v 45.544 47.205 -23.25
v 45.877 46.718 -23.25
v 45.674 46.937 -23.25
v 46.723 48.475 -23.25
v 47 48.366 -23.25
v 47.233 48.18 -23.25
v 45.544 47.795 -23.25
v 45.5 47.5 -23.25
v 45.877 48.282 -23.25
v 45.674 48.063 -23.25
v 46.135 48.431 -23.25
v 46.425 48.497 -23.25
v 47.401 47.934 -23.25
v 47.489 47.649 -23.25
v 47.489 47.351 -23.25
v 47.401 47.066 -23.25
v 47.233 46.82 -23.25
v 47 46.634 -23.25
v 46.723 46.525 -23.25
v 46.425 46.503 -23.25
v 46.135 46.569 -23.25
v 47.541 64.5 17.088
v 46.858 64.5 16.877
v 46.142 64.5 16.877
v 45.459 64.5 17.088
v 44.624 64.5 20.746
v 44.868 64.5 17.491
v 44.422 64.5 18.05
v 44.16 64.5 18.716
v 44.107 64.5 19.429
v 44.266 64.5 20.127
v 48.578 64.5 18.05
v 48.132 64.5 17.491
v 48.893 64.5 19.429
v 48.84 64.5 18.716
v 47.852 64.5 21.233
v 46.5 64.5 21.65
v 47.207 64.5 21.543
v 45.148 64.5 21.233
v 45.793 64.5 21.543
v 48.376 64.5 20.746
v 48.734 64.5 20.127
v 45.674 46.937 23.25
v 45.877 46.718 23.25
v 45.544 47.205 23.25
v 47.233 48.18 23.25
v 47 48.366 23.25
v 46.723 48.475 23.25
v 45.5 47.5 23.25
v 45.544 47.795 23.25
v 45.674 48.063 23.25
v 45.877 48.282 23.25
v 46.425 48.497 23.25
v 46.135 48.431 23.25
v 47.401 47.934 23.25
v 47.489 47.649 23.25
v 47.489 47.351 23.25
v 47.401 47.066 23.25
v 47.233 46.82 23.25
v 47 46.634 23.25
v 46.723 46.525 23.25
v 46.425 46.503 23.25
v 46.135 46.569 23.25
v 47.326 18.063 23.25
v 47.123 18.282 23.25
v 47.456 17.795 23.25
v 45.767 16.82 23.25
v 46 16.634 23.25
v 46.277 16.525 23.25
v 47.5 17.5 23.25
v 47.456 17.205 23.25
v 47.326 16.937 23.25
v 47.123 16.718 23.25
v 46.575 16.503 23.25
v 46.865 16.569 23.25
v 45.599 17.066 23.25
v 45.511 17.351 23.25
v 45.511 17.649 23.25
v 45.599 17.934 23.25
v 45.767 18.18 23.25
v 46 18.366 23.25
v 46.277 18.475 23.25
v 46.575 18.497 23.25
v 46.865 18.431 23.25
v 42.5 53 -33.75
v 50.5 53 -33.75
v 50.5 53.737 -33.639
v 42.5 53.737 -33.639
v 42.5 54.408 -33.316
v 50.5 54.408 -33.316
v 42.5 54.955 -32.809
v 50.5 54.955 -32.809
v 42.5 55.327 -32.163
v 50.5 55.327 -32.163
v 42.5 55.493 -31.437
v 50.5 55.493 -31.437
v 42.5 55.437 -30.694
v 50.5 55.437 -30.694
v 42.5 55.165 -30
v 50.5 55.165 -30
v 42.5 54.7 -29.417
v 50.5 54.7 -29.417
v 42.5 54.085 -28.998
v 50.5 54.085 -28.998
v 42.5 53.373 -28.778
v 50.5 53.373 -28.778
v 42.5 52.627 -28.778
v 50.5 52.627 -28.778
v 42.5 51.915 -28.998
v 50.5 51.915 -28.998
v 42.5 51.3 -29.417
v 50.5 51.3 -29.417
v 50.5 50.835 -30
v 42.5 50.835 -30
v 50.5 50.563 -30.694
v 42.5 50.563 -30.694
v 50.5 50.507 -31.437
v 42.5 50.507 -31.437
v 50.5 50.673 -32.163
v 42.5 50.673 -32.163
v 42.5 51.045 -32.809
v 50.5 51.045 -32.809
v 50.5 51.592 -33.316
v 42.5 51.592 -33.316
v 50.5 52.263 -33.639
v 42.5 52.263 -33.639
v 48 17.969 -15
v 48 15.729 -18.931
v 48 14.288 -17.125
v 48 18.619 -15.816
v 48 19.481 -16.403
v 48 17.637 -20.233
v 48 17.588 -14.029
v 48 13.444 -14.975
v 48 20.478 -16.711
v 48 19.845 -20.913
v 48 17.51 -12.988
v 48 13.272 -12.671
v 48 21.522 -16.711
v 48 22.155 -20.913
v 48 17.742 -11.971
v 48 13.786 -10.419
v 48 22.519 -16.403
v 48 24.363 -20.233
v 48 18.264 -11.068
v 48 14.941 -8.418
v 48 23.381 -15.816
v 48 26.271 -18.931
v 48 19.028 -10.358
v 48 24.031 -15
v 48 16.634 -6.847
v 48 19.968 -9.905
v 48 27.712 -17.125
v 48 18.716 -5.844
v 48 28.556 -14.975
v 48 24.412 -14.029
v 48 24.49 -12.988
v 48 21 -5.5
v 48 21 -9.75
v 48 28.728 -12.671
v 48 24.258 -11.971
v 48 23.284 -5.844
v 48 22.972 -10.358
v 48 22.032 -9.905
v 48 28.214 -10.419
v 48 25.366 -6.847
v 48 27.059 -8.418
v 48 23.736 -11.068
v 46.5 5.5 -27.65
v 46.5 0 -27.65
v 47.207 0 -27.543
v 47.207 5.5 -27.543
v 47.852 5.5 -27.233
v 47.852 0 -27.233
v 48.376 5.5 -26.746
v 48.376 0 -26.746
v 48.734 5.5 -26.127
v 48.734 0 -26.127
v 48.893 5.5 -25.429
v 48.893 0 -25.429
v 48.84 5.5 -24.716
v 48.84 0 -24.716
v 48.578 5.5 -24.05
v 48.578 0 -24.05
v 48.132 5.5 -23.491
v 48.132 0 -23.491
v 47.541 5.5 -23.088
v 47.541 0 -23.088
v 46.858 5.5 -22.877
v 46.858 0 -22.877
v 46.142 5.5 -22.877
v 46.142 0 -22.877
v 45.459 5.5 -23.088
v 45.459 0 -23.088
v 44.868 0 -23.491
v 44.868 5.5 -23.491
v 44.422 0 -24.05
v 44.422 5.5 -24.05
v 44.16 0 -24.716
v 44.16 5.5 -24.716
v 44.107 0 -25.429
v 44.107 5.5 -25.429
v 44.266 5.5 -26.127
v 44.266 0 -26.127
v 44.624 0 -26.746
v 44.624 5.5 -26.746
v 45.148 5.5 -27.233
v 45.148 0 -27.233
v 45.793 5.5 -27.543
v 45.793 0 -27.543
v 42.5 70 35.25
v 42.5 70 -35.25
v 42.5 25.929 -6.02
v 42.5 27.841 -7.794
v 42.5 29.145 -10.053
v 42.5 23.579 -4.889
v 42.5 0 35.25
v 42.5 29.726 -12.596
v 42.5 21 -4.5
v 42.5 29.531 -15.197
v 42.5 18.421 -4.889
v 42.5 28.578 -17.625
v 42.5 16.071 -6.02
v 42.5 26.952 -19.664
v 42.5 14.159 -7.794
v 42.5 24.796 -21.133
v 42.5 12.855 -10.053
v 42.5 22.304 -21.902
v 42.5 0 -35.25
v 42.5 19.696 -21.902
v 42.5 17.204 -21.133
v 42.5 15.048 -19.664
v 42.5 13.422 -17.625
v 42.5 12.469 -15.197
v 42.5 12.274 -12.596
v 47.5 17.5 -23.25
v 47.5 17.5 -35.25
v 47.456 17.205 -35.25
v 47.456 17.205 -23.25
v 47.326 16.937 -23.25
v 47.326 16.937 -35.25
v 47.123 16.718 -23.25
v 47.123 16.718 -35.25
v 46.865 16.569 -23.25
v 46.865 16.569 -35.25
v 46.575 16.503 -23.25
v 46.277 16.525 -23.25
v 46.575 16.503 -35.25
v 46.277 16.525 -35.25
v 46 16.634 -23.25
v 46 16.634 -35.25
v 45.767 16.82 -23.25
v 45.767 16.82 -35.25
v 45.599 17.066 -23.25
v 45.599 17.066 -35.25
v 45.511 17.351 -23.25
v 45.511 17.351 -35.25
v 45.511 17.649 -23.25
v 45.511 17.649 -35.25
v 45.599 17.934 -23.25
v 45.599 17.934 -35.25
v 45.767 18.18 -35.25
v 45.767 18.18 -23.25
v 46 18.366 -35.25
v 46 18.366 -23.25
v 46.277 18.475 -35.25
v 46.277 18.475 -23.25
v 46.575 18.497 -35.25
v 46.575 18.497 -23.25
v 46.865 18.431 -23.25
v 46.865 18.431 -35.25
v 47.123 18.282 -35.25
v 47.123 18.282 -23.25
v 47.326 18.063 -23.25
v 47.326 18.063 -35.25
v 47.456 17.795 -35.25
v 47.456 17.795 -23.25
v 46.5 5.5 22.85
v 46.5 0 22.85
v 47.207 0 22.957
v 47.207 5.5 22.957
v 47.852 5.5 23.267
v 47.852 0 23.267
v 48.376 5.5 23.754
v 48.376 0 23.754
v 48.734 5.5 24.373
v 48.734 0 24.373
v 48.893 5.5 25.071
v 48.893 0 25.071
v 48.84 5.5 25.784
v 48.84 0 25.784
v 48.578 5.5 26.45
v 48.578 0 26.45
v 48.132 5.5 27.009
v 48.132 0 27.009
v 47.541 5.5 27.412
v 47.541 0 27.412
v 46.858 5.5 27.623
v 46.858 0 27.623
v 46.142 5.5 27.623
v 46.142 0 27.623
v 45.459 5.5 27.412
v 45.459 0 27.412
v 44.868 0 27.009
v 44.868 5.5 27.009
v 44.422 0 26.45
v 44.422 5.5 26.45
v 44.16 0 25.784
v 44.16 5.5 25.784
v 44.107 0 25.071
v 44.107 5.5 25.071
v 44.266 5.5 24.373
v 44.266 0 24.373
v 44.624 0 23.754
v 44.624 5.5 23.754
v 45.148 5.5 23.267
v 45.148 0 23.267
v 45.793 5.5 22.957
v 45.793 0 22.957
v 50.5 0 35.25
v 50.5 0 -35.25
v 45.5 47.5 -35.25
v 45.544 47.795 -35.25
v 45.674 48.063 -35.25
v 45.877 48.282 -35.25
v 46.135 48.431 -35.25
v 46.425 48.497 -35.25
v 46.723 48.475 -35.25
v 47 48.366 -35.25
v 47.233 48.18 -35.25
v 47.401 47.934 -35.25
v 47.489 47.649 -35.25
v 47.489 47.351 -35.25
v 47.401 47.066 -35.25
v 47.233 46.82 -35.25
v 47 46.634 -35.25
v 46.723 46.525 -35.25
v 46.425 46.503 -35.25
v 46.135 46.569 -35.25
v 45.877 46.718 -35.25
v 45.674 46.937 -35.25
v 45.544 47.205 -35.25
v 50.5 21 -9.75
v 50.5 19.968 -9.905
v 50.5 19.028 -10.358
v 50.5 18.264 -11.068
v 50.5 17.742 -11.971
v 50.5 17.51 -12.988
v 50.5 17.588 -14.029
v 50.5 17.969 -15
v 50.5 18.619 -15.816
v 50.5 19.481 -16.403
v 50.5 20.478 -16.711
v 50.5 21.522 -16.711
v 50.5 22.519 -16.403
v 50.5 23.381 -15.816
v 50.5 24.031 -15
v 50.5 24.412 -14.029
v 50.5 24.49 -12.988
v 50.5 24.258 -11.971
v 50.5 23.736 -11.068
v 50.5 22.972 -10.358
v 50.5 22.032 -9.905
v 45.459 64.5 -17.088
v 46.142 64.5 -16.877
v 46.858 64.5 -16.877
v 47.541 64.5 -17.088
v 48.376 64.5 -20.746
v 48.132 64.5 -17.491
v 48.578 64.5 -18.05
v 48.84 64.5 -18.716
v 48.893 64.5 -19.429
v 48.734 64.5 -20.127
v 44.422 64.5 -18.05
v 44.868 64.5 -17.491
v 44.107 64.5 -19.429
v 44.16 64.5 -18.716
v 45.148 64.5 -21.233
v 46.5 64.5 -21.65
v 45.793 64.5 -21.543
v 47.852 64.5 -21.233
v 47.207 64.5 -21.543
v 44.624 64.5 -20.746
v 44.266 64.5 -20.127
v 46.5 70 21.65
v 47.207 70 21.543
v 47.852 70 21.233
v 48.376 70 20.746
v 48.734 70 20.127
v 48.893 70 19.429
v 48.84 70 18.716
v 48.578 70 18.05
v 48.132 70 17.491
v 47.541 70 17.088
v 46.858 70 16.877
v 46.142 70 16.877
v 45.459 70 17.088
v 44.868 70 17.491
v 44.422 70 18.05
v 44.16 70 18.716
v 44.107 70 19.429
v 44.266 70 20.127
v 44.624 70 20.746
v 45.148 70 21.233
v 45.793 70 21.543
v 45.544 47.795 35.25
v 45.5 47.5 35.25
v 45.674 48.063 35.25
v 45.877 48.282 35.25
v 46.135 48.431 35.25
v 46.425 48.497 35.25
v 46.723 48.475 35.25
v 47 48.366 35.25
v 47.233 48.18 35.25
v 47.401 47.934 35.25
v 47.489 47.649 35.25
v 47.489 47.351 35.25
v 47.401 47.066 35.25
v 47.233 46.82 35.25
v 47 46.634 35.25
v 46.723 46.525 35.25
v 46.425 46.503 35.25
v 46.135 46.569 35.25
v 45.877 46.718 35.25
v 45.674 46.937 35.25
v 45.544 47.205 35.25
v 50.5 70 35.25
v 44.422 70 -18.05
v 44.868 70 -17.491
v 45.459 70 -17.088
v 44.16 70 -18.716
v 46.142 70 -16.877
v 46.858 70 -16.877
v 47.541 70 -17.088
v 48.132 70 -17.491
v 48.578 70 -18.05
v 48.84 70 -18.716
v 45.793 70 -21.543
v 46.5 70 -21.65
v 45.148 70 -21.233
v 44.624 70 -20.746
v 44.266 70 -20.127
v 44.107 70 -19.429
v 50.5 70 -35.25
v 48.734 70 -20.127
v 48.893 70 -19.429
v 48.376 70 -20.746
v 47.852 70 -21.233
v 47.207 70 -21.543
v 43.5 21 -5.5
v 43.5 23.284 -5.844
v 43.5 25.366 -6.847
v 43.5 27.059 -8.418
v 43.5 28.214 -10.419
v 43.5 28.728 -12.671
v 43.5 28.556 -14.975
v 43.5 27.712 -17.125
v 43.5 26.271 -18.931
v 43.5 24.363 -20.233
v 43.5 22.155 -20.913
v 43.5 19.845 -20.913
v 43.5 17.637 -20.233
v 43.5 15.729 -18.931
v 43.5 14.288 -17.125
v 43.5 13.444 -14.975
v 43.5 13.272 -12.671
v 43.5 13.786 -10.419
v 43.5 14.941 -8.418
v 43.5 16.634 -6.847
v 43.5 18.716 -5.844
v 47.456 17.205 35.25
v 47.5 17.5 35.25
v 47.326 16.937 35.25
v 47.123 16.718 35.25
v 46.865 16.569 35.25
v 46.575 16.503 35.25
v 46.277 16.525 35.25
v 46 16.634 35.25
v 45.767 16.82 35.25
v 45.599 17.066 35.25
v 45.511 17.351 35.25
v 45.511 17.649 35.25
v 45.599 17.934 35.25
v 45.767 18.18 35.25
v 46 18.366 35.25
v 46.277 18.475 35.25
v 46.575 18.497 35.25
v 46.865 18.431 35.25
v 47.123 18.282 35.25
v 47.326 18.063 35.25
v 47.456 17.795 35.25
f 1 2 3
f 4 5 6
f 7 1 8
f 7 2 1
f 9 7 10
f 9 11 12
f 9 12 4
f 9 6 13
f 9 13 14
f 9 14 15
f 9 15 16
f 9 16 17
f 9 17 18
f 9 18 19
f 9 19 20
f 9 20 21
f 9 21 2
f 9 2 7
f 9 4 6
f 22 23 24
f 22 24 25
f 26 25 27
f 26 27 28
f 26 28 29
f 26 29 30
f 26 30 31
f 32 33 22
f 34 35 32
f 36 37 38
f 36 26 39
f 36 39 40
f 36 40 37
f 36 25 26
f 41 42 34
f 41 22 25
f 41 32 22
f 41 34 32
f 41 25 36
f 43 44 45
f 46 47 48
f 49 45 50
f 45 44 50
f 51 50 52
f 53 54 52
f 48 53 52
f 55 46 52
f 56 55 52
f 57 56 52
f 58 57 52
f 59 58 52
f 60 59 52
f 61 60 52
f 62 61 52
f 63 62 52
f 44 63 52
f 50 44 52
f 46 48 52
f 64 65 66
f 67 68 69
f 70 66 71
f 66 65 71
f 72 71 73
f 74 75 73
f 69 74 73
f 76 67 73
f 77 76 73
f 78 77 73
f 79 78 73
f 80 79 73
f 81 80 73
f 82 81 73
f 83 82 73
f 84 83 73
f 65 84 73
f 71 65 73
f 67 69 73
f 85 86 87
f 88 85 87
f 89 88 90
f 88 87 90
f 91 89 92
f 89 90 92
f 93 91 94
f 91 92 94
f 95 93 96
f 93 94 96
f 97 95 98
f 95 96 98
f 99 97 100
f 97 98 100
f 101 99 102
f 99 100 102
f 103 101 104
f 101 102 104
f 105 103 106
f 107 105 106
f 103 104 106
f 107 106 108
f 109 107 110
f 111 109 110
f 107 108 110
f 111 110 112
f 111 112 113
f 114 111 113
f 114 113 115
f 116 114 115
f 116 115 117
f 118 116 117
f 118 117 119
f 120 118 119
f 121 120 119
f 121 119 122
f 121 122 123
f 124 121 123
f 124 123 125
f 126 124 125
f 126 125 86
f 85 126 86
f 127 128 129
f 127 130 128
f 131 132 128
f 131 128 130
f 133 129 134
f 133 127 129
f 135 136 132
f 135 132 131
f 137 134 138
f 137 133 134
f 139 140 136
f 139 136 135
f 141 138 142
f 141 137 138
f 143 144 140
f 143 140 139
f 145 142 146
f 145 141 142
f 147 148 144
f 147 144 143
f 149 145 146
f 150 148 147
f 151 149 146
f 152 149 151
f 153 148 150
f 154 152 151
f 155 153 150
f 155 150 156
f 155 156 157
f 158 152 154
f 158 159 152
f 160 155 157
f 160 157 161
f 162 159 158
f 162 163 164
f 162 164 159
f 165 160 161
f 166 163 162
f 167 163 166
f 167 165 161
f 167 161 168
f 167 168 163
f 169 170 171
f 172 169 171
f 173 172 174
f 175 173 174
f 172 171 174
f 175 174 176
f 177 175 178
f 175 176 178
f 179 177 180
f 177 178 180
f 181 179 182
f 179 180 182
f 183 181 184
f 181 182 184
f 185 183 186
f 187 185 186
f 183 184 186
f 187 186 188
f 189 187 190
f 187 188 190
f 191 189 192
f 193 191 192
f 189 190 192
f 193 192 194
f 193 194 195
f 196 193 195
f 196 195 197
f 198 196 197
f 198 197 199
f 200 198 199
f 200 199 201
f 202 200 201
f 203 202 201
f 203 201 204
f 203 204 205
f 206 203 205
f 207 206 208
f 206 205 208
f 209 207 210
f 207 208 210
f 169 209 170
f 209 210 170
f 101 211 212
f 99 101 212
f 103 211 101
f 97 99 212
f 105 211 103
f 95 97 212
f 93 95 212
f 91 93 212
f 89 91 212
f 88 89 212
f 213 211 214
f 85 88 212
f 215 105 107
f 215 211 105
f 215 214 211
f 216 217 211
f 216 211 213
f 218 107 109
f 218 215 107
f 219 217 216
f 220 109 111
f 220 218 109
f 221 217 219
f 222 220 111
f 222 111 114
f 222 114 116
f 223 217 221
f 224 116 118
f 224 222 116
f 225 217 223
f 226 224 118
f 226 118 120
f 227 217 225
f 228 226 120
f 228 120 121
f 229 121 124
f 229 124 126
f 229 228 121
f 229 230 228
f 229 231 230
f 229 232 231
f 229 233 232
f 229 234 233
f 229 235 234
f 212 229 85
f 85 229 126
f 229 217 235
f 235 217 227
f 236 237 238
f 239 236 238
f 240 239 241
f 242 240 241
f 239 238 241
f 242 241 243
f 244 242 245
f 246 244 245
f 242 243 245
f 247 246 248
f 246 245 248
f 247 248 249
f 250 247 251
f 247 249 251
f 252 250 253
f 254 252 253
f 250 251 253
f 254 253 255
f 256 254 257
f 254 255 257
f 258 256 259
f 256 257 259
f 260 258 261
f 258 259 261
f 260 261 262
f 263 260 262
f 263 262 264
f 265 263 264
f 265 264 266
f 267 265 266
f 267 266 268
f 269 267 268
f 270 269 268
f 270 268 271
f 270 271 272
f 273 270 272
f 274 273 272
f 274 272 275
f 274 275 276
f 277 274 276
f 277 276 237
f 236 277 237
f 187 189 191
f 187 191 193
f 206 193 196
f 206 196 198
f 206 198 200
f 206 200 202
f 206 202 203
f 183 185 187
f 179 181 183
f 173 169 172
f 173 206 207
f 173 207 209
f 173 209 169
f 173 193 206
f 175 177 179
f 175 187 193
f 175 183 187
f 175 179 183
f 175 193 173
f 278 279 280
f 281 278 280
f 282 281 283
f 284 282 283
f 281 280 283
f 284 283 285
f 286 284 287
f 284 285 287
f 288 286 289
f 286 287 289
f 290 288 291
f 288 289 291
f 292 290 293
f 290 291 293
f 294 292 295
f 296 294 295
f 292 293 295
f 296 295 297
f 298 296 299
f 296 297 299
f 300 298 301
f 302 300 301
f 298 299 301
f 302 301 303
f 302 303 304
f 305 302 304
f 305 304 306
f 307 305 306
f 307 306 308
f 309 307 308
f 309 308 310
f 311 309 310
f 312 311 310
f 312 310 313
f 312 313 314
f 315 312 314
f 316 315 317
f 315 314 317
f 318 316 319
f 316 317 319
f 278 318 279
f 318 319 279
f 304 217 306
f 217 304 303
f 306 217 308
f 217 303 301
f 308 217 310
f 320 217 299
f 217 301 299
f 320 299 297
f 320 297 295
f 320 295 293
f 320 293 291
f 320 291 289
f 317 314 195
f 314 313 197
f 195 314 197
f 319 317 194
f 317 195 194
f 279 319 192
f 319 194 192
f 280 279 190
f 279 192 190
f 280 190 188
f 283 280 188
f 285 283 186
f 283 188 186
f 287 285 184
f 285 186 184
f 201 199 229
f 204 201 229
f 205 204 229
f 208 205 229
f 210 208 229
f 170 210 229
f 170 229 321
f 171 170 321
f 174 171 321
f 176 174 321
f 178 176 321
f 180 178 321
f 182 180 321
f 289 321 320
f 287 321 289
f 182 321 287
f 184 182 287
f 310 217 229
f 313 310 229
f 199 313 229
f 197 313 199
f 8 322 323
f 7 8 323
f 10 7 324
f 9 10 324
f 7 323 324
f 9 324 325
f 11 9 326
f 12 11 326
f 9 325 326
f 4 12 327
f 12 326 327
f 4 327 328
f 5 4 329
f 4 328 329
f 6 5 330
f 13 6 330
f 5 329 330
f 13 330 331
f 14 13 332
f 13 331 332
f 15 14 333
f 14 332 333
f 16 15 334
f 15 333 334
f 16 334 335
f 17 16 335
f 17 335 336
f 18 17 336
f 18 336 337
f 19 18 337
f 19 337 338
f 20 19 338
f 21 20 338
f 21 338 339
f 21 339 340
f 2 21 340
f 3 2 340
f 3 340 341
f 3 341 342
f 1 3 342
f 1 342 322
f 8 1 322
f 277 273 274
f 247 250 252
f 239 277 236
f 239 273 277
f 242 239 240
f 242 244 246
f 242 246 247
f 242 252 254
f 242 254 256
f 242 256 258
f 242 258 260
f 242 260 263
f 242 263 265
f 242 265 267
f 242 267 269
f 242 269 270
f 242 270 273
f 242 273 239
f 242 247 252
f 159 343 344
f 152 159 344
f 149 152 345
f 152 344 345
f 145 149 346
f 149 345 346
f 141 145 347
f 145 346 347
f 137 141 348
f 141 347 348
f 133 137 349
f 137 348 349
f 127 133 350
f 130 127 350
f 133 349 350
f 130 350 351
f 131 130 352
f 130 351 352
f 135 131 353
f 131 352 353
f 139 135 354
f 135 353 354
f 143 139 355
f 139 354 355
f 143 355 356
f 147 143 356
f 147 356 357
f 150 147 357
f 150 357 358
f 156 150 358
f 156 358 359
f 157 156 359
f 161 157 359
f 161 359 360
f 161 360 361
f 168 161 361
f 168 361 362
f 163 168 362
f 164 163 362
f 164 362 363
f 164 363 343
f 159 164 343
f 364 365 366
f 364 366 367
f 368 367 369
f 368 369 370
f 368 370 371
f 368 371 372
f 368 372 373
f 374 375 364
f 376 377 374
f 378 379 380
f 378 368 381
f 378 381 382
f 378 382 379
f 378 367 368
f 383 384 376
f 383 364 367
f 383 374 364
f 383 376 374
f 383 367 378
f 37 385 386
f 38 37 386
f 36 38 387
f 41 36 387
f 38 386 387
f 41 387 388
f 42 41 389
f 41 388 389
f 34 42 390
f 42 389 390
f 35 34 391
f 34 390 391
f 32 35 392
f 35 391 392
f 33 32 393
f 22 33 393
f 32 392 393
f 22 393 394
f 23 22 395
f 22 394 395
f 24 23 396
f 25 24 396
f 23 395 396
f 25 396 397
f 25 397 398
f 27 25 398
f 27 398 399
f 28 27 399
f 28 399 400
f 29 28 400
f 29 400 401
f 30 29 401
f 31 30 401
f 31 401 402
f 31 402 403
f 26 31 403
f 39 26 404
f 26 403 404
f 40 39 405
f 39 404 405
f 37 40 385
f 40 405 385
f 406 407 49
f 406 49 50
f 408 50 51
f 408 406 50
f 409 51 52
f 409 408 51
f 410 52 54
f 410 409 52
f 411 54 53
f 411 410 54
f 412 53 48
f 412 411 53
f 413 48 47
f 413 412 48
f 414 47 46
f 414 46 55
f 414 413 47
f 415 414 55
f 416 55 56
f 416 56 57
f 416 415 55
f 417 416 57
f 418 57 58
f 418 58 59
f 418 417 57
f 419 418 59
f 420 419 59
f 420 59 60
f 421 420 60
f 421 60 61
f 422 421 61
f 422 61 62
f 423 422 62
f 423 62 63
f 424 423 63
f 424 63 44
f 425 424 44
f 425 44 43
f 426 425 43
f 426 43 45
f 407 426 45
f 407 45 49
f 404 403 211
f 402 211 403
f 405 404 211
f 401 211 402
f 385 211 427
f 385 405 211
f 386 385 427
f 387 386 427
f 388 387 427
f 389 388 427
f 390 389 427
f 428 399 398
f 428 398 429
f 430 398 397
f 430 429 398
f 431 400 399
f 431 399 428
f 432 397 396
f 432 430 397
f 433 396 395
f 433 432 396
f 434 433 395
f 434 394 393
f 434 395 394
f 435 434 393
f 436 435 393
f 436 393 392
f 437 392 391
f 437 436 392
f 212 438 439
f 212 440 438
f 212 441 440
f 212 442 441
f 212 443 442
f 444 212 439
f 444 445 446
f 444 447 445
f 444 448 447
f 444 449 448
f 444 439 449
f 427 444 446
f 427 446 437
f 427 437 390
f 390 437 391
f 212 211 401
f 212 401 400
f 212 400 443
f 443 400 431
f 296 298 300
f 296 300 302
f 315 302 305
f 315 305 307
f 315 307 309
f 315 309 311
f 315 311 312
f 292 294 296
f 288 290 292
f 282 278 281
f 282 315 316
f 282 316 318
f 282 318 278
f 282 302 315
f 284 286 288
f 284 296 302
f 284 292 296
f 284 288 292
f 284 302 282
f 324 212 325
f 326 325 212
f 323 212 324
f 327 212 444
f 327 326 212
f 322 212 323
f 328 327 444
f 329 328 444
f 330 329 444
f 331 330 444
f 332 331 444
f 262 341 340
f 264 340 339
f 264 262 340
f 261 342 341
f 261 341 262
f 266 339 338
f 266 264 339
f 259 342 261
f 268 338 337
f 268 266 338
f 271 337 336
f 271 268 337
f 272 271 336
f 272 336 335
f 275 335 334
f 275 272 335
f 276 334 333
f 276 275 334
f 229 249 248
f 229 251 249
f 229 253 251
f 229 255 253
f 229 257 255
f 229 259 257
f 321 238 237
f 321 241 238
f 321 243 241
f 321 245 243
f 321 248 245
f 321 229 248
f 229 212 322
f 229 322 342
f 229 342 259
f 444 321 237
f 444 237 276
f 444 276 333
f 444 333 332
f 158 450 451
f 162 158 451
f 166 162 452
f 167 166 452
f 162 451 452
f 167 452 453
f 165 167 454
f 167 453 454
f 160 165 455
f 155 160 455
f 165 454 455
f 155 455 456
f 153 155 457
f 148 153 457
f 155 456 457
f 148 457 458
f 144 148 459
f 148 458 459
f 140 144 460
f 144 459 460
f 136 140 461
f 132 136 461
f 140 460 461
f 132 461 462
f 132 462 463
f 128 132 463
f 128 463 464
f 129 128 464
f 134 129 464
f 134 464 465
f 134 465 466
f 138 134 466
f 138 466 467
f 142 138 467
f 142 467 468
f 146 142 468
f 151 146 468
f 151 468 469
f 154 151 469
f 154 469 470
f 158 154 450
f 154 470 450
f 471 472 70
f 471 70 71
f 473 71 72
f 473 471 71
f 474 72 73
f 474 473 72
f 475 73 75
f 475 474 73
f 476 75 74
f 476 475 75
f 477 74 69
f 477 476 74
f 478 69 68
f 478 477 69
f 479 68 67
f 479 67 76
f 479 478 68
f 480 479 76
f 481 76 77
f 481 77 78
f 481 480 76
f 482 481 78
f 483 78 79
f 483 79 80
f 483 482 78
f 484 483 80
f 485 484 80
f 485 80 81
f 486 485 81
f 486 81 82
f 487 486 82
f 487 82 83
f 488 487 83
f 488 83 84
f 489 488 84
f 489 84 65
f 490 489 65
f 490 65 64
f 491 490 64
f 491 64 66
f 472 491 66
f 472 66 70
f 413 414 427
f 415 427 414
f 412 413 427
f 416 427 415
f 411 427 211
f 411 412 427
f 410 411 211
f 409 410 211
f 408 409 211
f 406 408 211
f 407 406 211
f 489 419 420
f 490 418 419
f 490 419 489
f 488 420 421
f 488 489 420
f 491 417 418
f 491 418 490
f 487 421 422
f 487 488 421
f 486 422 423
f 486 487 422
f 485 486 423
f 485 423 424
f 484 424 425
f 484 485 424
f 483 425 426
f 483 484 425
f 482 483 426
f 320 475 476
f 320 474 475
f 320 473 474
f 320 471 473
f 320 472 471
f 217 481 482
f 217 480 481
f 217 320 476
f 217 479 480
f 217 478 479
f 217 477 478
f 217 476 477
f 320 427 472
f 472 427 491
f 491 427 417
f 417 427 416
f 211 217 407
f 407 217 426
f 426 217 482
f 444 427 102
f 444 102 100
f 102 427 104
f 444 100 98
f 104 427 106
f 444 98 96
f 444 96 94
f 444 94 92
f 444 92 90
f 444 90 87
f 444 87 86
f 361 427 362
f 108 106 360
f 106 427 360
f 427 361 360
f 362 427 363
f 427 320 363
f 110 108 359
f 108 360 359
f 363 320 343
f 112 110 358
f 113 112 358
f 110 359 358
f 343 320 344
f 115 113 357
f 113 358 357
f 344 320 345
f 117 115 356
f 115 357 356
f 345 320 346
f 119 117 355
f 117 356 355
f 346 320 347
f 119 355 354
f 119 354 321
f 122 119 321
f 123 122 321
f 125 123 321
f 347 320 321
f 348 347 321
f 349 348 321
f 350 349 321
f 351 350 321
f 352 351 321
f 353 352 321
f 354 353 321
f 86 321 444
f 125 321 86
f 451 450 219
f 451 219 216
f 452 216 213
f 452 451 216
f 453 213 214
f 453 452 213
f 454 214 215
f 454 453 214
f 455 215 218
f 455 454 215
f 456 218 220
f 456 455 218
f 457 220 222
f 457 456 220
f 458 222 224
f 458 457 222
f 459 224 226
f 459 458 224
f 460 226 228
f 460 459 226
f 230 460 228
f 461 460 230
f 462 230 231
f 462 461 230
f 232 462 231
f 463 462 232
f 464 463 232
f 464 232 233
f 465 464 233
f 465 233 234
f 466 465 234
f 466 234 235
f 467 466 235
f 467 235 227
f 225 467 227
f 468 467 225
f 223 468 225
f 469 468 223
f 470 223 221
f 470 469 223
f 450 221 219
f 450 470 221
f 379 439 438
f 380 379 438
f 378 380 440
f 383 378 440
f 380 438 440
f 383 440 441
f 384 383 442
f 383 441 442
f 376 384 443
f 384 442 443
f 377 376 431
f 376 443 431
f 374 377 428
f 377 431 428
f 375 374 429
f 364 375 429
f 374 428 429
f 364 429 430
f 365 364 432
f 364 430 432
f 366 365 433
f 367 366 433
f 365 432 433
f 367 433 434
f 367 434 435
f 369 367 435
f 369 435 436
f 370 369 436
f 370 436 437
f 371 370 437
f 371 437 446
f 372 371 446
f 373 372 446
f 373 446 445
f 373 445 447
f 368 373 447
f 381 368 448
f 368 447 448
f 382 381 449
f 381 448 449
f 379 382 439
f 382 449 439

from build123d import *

# Parameters (mm, degrees)
SKETCH1_W                                           = 85
SKETCH1_H                                           = 70.5
BOSS_EXTRUDE1_DEPTH                                 = 70
SHELL1_T                                            = 8
CUT_EXTRUDE1_REACH                                  = 132.275
SKETCH2_R                                           = 3.5
CUT_EXTRUDE1_DIRECTION_2_DEPTH                      = 131.274949626
CBORE_FOR_M3_HEX_SOCKET_HEAD_CAP_SCREW1_D           = 3.8
CBORE_FOR_M3_HEX_SOCKET_HEAD_CAP_SCREW1_DEPTH       = 10
CBORE_FOR_M3_HEX_SOCKET_HEAD_CAP_SCREW1_CBORE_D     = 8
CBORE_FOR_M3_HEX_SOCKET_HEAD_CAP_SCREW1_CBORE_DEPTH = 3.4
CBORE_FOR_M3_HEX_SOCKET_HEAD_CAP_SCREW1_TIP         = 1.141635176
SKETCH14_W                                          = 12
SKETCH14_H                                          = 14
CUT_EXTRUDE3_DEPTH                                  = 5.5
SKETCH15_R                                          = 3.45
CUT_EXTRUDE4_DEPTH                                  = 101.60349149
SKETCH16_W                                          = 12
SKETCH16_H                                          = 2.5
CUT_EXTRUDE5_DEPTH                                  = 1.5
SKETCH17_W                                          = 7.1
SKETCH17_H                                          = 4.1
SKETCH17_W_2                                        = 7.8
SKETCH17_H_2                                        = 6
CUT_EXTRUDE6_DEPTH                                  = 97.544355091
CUT_EXTRUDE7_DEPTH                                  = 97.544355091
CUT_EXTRUDE8_DEPTH                                  = 125.175531003
CHAMFER2_SIZE                                       = 1
LPATTERN1_COUNT                                     = 5
LPATTERN1_PITCH                                     = 8
CHAMFER2_OF_LPATTERN1_SIZE                          = 1
CBORE_FOR_M3_HEX_SOCKET_HEAD_CAP_SCREW4_D           = 3.6
CBORE_FOR_M3_HEX_SOCKET_HEAD_CAP_SCREW4_DEPTH       = 10
CBORE_FOR_M3_HEX_SOCKET_HEAD_CAP_SCREW4_CBORE_D     = 6.5
CBORE_FOR_M3_HEX_SOCKET_HEAD_CAP_SCREW4_CBORE_DEPTH = 3.4
CBORE_FOR_M3_HEX_SOCKET_HEAD_CAP_SCREW4_TIP         = 1.081549114
SKETCH26_R                                          = 7.75
CUT_EXTRUDE9_DEPTH                                  = 5.5
CHAMFER1_SIZE                                       = 1
SKETCH28_R                                          = 2.4
CUT_EXTRUDE11_DEPTH                                 = 5.5
CHAMFER3_SIZE                                       = 1
FILLET4_R                                           = 3
SKETCH34_R                                          = 1
CUT_EXTRUDE13_DEPTH                                 = 20
CUT_EXTRUDE14_START                                 = -8
SKETCH35_R                                          = 2.4
CUT_EXTRUDE14_DEPTH                                 = 5.5
CBORE_FOR_M3_HEX_SOCKET_HEAD_CAP_SCREW5_D           = 3.6
CBORE_FOR_M3_HEX_SOCKET_HEAD_CAP_SCREW5_DEPTH       = 13.499
CBORE_FOR_M3_HEX_SOCKET_HEAD_CAP_SCREW5_CBORE_D     = 6.5
CBORE_FOR_M3_HEX_SOCKET_HEAD_CAP_SCREW5_CBORE_DEPTH = 3.4
SKETCH40_R                                          = 2.5
CUT_EXTRUDE16_DEPTH                                 = 131.274949737
CBORE_FOR_M4_HEX_SOCKET_HEAD_CAP_SCREW1_D           = 4.5
CBORE_FOR_M4_HEX_SOCKET_HEAD_CAP_SCREW1_DEPTH       = 18
CBORE_FOR_M4_HEX_SOCKET_HEAD_CAP_SCREW1_CBORE_D     = 8
CBORE_FOR_M4_HEX_SOCKET_HEAD_CAP_SCREW1_CBORE_DEPTH = 4.4
CBORE_FOR_M3_HEX_SOCKET_HEAD_CAP_SCREW6_D           = 3.4
CBORE_FOR_M3_HEX_SOCKET_HEAD_CAP_SCREW6_DEPTH       = 18
CBORE_FOR_M3_HEX_SOCKET_HEAD_CAP_SCREW6_CBORE_D     = 6.5
CBORE_FOR_M3_HEX_SOCKET_HEAD_CAP_SCREW6_CBORE_DEPTH = 3.4
CBORE_FOR_M3_HEX_SOCKET_HEAD_CAP_SCREW6_TIP         = 1.021463052
CUT_EXTRUDE18_REACH                                 = 124.199
SKETCH53_W                                          = 10
SKETCH53_H                                          = 6.8
SPLIT5_START                                        = -8
SPLIT5_OUTLINE_W                                    = 14
SPLIT5_OUTLINE_H                                    = 12
SPLIT5_OUTLINE_R                                    = 3.45
SPLIT5_OUTLINE_R_2                                  = 3.25
SPLIT5_OUTLINE_R_3                                  = 1.8
SPLIT5_OUTLINE_R_4                                  = 1.7
SPLIT5_DEPTH                                        = 78
SPLIT5_2_OUTLINE_W                                  = 14
SPLIT5_2_OUTLINE_H                                  = 12
SPLIT5_2_OUTLINE_R                                  = 3.25
SPLIT5_2_OUTLINE_W_2                                = 7.1
SPLIT5_2_OUTLINE_H_2                                = 4.1
SPLIT5_2_OUTLINE_W_3                                = 7.8
SPLIT5_2_OUTLINE_H_3                                = 6
SPLIT5_2_OUTLINE_R_2                                = 1.8
SPLIT5_2_DEPTH                                      = 8


# Read off the part's stored shape, not the designer's step: Split5
with BuildPart() as part:
    # Sketch1 → Boss-Extrude1 (new body)
    with BuildSketch(Plane(origin=(0, 0, 0), x_dir=(1, 0, 0), z_dir=(0, 1, 0))):
        Rectangle(SKETCH1_W, SKETCH1_H)
    extrude(amount=BOSS_EXTRUDE1_DEPTH)

    # Shell1
    shell1_openings = [part.faces().sort_by_distance(p)[0] for p in [
        (0, 70, 0),
    ]]
    offset(amount=SHELL1_T, openings=shell1_openings, kind=Kind.INTERSECTION)

    # Sketch2 → Cut-Extrude1 (cut, up to next)
    with BuildSketch(Plane(origin=(50.5, 0, 0), x_dir=(0, 0, -1), z_dir=(1, 0, 0)), mode=Mode.PRIVATE) as cut_extrude1_sk1:
        with Locations(Location((13.25, 21, 0), (0, 0, 180))):
            Circle(SKETCH2_R)
    cut_extrude1_tool1 = extrude(cut_extrude1_sk1.sketch, amount=-CUT_EXTRUDE1_REACH, mode=Mode.PRIVATE) & part.part
    add(cut_extrude1_tool1.solids().sort_by_distance((50.5, 21, -13.25))[0], mode=Mode.SUBTRACT)

    # Sketch2 → Cut-Extrude1 direction 2 (cut)
    with BuildSketch(Plane(origin=(50.5, 0, 0), x_dir=(0, 0, -1), z_dir=(1, 0, 0))):
        with Locations(Location((13.25, 21, 0), (0, 0, 180))):
            Circle(SKETCH2_R)
    extrude(amount=CUT_EXTRUDE1_DIRECTION_2_DEPTH, mode=Mode.SUBTRACT)

    # CBORE for M3 Hex Socket Head Cap Screw1
    with Locations(Plane.XY.offset(43.25)):
        with Locations((-34, 55.5), (-3, 55.5), (-34, 24.5)):
            CounterBoreHole(CBORE_FOR_M3_HEX_SOCKET_HEAD_CAP_SCREW1_D / 2, CBORE_FOR_M3_HEX_SOCKET_HEAD_CAP_SCREW1_CBORE_D / 2, CBORE_FOR_M3_HEX_SOCKET_HEAD_CAP_SCREW1_CBORE_DEPTH, depth=CBORE_FOR_M3_HEX_SOCKET_HEAD_CAP_SCREW1_DEPTH)
            with Locations((0, 0, -(CBORE_FOR_M3_HEX_SOCKET_HEAD_CAP_SCREW1_DEPTH + CBORE_FOR_M3_HEX_SOCKET_HEAD_CAP_SCREW1_TIP / 2))):  # 118° drill point
                Cone(0, CBORE_FOR_M3_HEX_SOCKET_HEAD_CAP_SCREW1_D / 2, CBORE_FOR_M3_HEX_SOCKET_HEAD_CAP_SCREW1_TIP, mode=Mode.SUBTRACT)

    # Sketch14 → Cut-Extrude3 (cut)
    with BuildSketch(Plane(origin=(-42.5, 0, 0), x_dir=(0, 0, -1), z_dir=(0, 1, 0))):
        with Locations((-17.25, -13)):
            Rectangle(SKETCH14_W, SKETCH14_H)
    extrude(amount=-CUT_EXTRUDE3_DEPTH, mode=Mode.SUBTRACT)

    # Sketch15 → Cut-Extrude4 (cut, through all)
    with BuildSketch(Plane(origin=(0, -5.5, 0), x_dir=(0, 0, -1), z_dir=(0, 1, 0))):
        with Locations(Location((-17.25, 29.5, 0), (0, 0, 90))):
            Circle(SKETCH15_R)
    extrude(amount=-CUT_EXTRUDE4_DEPTH, mode=Mode.SUBTRACT)

    # Sketch16 → Cut-Extrude5 (cut)
    with BuildSketch(Plane(origin=(0, -5.5, 0), x_dir=(0, 0, -1), z_dir=(0, 1, 0))):
        with Locations((-17.25, 35.25)):
            Rectangle(SKETCH16_W, SKETCH16_H)
    extrude(amount=-CUT_EXTRUDE5_DEPTH, mode=Mode.SUBTRACT)

    # Sketch17 → Cut-Extrude6 (cut, through all)
    with BuildSketch(Plane(origin=(0, 0, 0), x_dir=(1, 0, 0), z_dir=(0, 1, 0))):
        with Locations((19.15, -29.25)):
            Rectangle(SKETCH17_W, SKETCH17_H)
        with Locations((30.6, -29.25)):
            Rectangle(SKETCH17_W_2, SKETCH17_H_2)
    extrude(amount=-CUT_EXTRUDE6_DEPTH, mode=Mode.SUBTRACT)

    # Sketch18 → Cut-Extrude7 (cut, through all)
    with BuildSketch(Plane(origin=(0, 0, 0), x_dir=(1, 0, 0), z_dir=(0, 1, 0))):
        with BuildLine():
            Line((-19.5, -29.25), (-19.5, -21.25))
            ThreePointArc((-19.5, -21.25), (-17.5, -19.25), (-15.5, -21.25))
            Line((-15.5, -21.25), (-15.5, -29.25))
            ThreePointArc((-15.5, -29.25), (-17.5, -31.25), (-19.5, -29.25))
        make_face()
        with BuildLine():
            Line((-7.5, -29.25), (-7.5, -21.25))
            ThreePointArc((-7.5, -21.25), (-9.5, -19.25), (-11.5, -21.25))
            Line((-11.5, -21.25), (-11.5, -29.25))
            ThreePointArc((-11.5, -29.25), (-9.5, -31.25), (-7.5, -29.25))
        make_face()
    extrude(amount=-CUT_EXTRUDE7_DEPTH, mode=Mode.SUBTRACT)

    # Sketch19 → Cut-Extrude8 (cut, through all)
    with BuildSketch(Plane(origin=(-42.5, 0, 0), x_dir=(0, 0, -1), z_dir=(1, 0, 0))):
        with BuildLine():
            Line((-27.75, 60), (-27.75, 15))
            ThreePointArc((-27.75, 15), (-29.25, 13.5), (-30.75, 15))
            Line((-30.75, 15), (-30.75, 60))
            ThreePointArc((-30.75, 60), (-29.25, 61.5), (-27.75, 60))
        make_face()
    cut_extrude8 = extrude(amount=-CUT_EXTRUDE8_DEPTH, mode=Mode.SUBTRACT)

    # Chamfer2
    chamfer2_edges = [part.edges().sort_by_distance(p)[0] for p in [
        (-50.5, 61.5, 29.25),
        (-50.5, 37.5, 27.75),
        (-50.5, 13.5, 29.25),
        (-50.5, 37.5, 30.75),
        (-42.5, 61.5, 29.25),
        (-42.5, 37.5, 30.75),
        (-42.5, 13.5, 29.25),
        (-42.5, 37.5, 27.75),
    ]]
    chamfer(chamfer2_edges, length=CHAMFER2_SIZE)

    # LPattern1: Cut-Extrude8 ×5
    with Locations(*[(0, 0, -i * LPATTERN1_PITCH) for i in range(1, LPATTERN1_COUNT)]):
        add(cut_extrude8, mode=Mode.SUBTRACT)

    # Chamfer2 of LPattern1
    chamfer2_of_lpattern1_edges = [part.edges().sort_by_distance(p)[0] for p in [
        (-50.5, 61.5, 21.25),
        (-50.5, 37.5, 19.75),
        (-50.5, 13.5, 21.25),
        (-50.5, 37.5, 22.75),
        (-42.5, 61.5, 21.25),
        (-42.5, 37.5, 22.75),
        (-42.5, 13.5, 21.25),
        (-42.5, 37.5, 19.75),
        (-50.5, 61.5, 13.25),
        (-50.5, 37.5, 11.75),
        (-50.5, 13.5, 13.25),
        (-50.5, 37.5, 14.75),
        (-42.5, 61.5, 13.25),
        (-42.5, 37.5, 14.75),
        (-42.5, 13.5, 13.25),
        (-42.5, 37.5, 11.75),
        (-50.5, 61.5, 5.25),
        (-50.5, 37.5, 3.75),
        (-50.5, 13.5, 5.25),
        (-50.5, 37.5, 6.75),
        (-42.5, 61.5, 5.25),
        (-42.5, 37.5, 6.75),
        (-42.5, 13.5, 5.25),
        (-42.5, 37.5, 3.75),
        (-50.5, 61.5, -2.75),
        (-50.5, 37.5, -4.25),
        (-50.5, 13.5, -2.75),
        (-50.5, 37.5, -1.25),
        (-42.5, 61.5, -2.75),
        (-42.5, 37.5, -1.25),
        (-42.5, 13.5, -2.75),
        (-42.5, 37.5, -4.25),
    ]]
    chamfer(chamfer2_of_lpattern1_edges, length=CHAMFER2_OF_LPATTERN1_SIZE)

    # CBORE for M3 Hex Socket Head Cap Screw4
    with Locations(Plane(origin=(0, 0, 0), x_dir=(1, 0, 0), z_dir=(0, 1, 0))):
        with Locations((33.5, 23.25), (33.5, 3.25), (13.5, 13.25), (-6.5, 23.25), (-6.5, 3.25)):
            CounterBoreHole(CBORE_FOR_M3_HEX_SOCKET_HEAD_CAP_SCREW4_D / 2, CBORE_FOR_M3_HEX_SOCKET_HEAD_CAP_SCREW4_CBORE_D / 2, CBORE_FOR_M3_HEX_SOCKET_HEAD_CAP_SCREW4_CBORE_DEPTH, depth=CBORE_FOR_M3_HEX_SOCKET_HEAD_CAP_SCREW4_DEPTH)
            with Locations((0, 0, -(CBORE_FOR_M3_HEX_SOCKET_HEAD_CAP_SCREW4_DEPTH + CBORE_FOR_M3_HEX_SOCKET_HEAD_CAP_SCREW4_TIP / 2))):  # 118° drill point
                Cone(0, CBORE_FOR_M3_HEX_SOCKET_HEAD_CAP_SCREW4_D / 2, CBORE_FOR_M3_HEX_SOCKET_HEAD_CAP_SCREW4_TIP, mode=Mode.SUBTRACT)

    # Sketch26 → Cut-Extrude9 (cut)
    with BuildSketch(Plane.ZY.offset(-42.5)):
        with Locations((-13.25, 21)):
            Circle(SKETCH26_R)
    extrude(amount=-CUT_EXTRUDE9_DEPTH, mode=Mode.SUBTRACT)

    # Chamfer1
    chamfer1_edges = [part.edges().sort_by_distance(p)[0] for p in [
        (42.5, 21, -21),
    ]]
    chamfer(chamfer1_edges, length=CHAMFER1_SIZE)

    # Sketch28 → Cut-Extrude11 (cut)
    with BuildSketch(Plane(origin=(0, 70, 0), x_dir=(1, 0, 0), z_dir=(0, 1, 0))):
        with Locations(Location((-26.5, 39.25, 0), (0, 0, 270))):
            Circle(SKETCH28_R)
        with Locations(Location((-46.5, 19.25, 0), (0, 0, 270))):
            Circle(SKETCH28_R)
        with Locations(Location((46.5, 19.25, 0), (0, 0, 90))):
            Circle(SKETCH28_R)
        with Locations(Location((26.5, 39.25, 0), (0, 0, 90))):
            Circle(SKETCH28_R)
        with Locations(Location((26.5, -39.25, 0), (0, 0, 270))):
            Circle(SKETCH28_R)
        with Locations(Location((46.5, -19.25, 0), (0, 0, 270))):
            Circle(SKETCH28_R)
        with Locations(Location((-46.5, -19.25, 0), (0, 0, 90))):
            Circle(SKETCH28_R)
        with Locations(Location((-26.5, -39.25, 0), (0, 0, 90))):
            Circle(SKETCH28_R)
    extrude(amount=-CUT_EXTRUDE11_DEPTH, mode=Mode.SUBTRACT)

    # Chamfer3
    chamfer3_edges = [part.edges().sort_by_distance(p)[0] for p in [
        (34.5, 0, 29.25),
        (30.6, 0, 26.25),
        (26.7, 0, 29.25),
        (30.6, 0, 32.25),
        (22.7, 0, 29.25),
        (19.15, 0, 27.2),
        (15.6, 0, 29.25),
        (19.15, 0, 31.3),
    ]]
    chamfer(chamfer3_edges, length=CHAMFER3_SIZE)

    # Fillet4
    fillet4_edges = [part.edges().sort_by_distance(p)[0] for p in [
        (0, -8, 43.25),
        (-50.5, -8, 0),
        (0, -8, -43.25),
        (50.5, -8, 0),
        (50.5, 31, 43.25),
        (-50.5, 31, 43.25),
        (-50.5, 31, -43.25),
        (50.5, 31, -43.25),
    ]]
    fillet(fillet4_edges, radius=FILLET4_R)

    # Sketch34 → Cut-Extrude13 (cut)
    with BuildSketch(Plane(origin=(0, 0, -43.25), x_dir=(-1, 0, 0), z_dir=(0, 0, -1))):
        with Locations((-46.5, 47.5)):
            Circle(SKETCH34_R)
        with Locations(Location((-46.5, 17.5, 0), (0, 0, 180))):
            Circle(SKETCH34_R)
        with Locations((46.5, 17.5)):
            Circle(SKETCH34_R)
        with Locations((46.5, 47.5)):
            Circle(SKETCH34_R)
    cut_extrude13 = extrude(amount=-CUT_EXTRUDE13_DEPTH, mode=Mode.SUBTRACT)

    # Mirror2: Cut-Extrude13 across plane
    add(cut_extrude13.mirror(Plane.XY), mode=Mode.SUBTRACT)

    # Sketch35 → Cut-Extrude14 (cut)
    with BuildSketch(Plane.XZ.offset(8).offset(CUT_EXTRUDE14_START)):
        with Locations(Location((46.5, 25.25, 0), (0, 0, 270))):
            Circle(SKETCH35_R)
        with Locations(Location((46.5, -25.25, 0), (0, 0, 270))):
            Circle(SKETCH35_R)
        with Locations(Location((-46.5, -25.25, 0), (0, 0, 270))):
            Circle(SKETCH35_R)
        with Locations(Location((-46.5, 25.25, 0), (0, 0, 270))):
            Circle(SKETCH35_R)
        with Locations(Location((32.5, 39.25, 0), (0, 0, 270))):
            Circle(SKETCH35_R)
        with Locations(Location((-32.5, 39.25, 0), (0, 0, 270))):
            Circle(SKETCH35_R)
        with Locations(Location((-32.5, -39.25, 0), (0, 0, 270))):
            Circle(SKETCH35_R)
        with Locations(Location((32.5, -39.25, 0), (0, 0, 270))):
            Circle(SKETCH35_R)
    extrude(amount=-CUT_EXTRUDE14_DEPTH, mode=Mode.SUBTRACT)

    # CBORE for M3 Hex Socket Head Cap Screw5
    with Locations(Plane(origin=(0, -8, 0), x_dir=(-1, 0, 0), z_dir=(0, -1, 0))):
        with Locations((-46.5, -25.25), (46.5, -25.25), (46.5, 25.25), (32.5, 39.25), (-32.5, 39.25), (-46.5, 25.25), (-32.5, -39.25), (32.5, -39.25)):
            CounterBoreHole(CBORE_FOR_M3_HEX_SOCKET_HEAD_CAP_SCREW5_D / 2, CBORE_FOR_M3_HEX_SOCKET_HEAD_CAP_SCREW5_CBORE_D / 2, CBORE_FOR_M3_HEX_SOCKET_HEAD_CAP_SCREW5_CBORE_DEPTH, depth=CBORE_FOR_M3_HEX_SOCKET_HEAD_CAP_SCREW5_DEPTH)

    # Sketch40 → Cut-Extrude16 (cut, through all)
    with BuildSketch(Plane(origin=(50.5, 0, 0), x_dir=(0, 0, -1), z_dir=(1, 0, 0))):
        with Locations((31.25, 53)):
            Circle(SKETCH40_R)
    extrude(amount=-CUT_EXTRUDE16_DEPTH, mode=Mode.SUBTRACT)

    # CBORE for M4 Hex Socket Head Cap Screw1
    with Locations(Plane(origin=(0, -8, 0), x_dir=(-1, 0, 0), z_dir=(0, -1, 0))):
        with Locations((-24.7, 38.75), (6, 38.75)):
            CounterBoreHole(CBORE_FOR_M4_HEX_SOCKET_HEAD_CAP_SCREW1_D / 2, CBORE_FOR_M4_HEX_SOCKET_HEAD_CAP_SCREW1_CBORE_D / 2, CBORE_FOR_M4_HEX_SOCKET_HEAD_CAP_SCREW1_CBORE_DEPTH, depth=CBORE_FOR_M4_HEX_SOCKET_HEAD_CAP_SCREW1_DEPTH)

    # CBORE for M3 Hex Socket Head Cap Screw6
    with Locations(Plane(origin=(0, -8, 0), x_dir=(-1, 0, 0), z_dir=(0, -1, 0))):
        with Locations((-24.7, -12.25), (6, -12.25)):
            CounterBoreHole(CBORE_FOR_M3_HEX_SOCKET_HEAD_CAP_SCREW6_D / 2, CBORE_FOR_M3_HEX_SOCKET_HEAD_CAP_SCREW6_CBORE_D / 2, CBORE_FOR_M3_HEX_SOCKET_HEAD_CAP_SCREW6_CBORE_DEPTH, depth=CBORE_FOR_M3_HEX_SOCKET_HEAD_CAP_SCREW6_DEPTH)
            with Locations((0, 0, -(CBORE_FOR_M3_HEX_SOCKET_HEAD_CAP_SCREW6_DEPTH + CBORE_FOR_M3_HEX_SOCKET_HEAD_CAP_SCREW6_TIP / 2))):  # 118° drill point
                Cone(0, CBORE_FOR_M3_HEX_SOCKET_HEAD_CAP_SCREW6_D / 2, CBORE_FOR_M3_HEX_SOCKET_HEAD_CAP_SCREW6_TIP, mode=Mode.SUBTRACT)

    # Cut-Extrude18: up to this face of the body (flat: up to its plane)
    cut_extrude18_end = Plane(part.part.faces().sort_by_distance((0, 35, -35.25))[0])
    # Sketch53 → Cut-Extrude18 (cut, up to the picked face)
    with BuildSketch(Plane(origin=(0, 0, -43.25), x_dir=(-1, 0, 0), z_dir=(0, 0, -1)), mode=Mode.PRIVATE) as cut_extrude18_sk1:
        with Locations((-24.7, 3.4)):
            Rectangle(SKETCH53_W, SKETCH53_H)
    cut_extrude18_tool1 = split(extrude(cut_extrude18_sk1.sketch, amount=-CUT_EXTRUDE18_REACH, mode=Mode.PRIVATE), bisect_by=cut_extrude18_end, keep=Keep.BOTH, mode=Mode.PRIVATE)
    # Sketch53 → Cut-Extrude18 (cut, up to the picked face)
    with BuildSketch(Plane(origin=(0, 0, -43.25), x_dir=(-1, 0, 0), z_dir=(0, 0, -1)), mode=Mode.PRIVATE) as cut_extrude18_sk2:
        with Locations((6, 3.4)):
            Rectangle(SKETCH53_W, SKETCH53_H)
    cut_extrude18_tool2 = split(extrude(cut_extrude18_sk2.sketch, amount=-CUT_EXTRUDE18_REACH, mode=Mode.PRIVATE), bisect_by=cut_extrude18_end, keep=Keep.BOTH, mode=Mode.PRIVATE)
    add(cut_extrude18_tool1.solids().sort_by(Axis((24.7, 3.4, -43.25), (0, 0, 1)))[0], mode=Mode.SUBTRACT)
    add(cut_extrude18_tool2.solids().sort_by(Axis((-6, 3.4, -43.25), (0, 0, 1)))[0], mode=Mode.SUBTRACT)

    # Split5 outline → Split5 (cut)
    # profile 1 of 9: a face of its own
    with BuildSketch(Plane(origin=(0, 0, 0), x_dir=(1, 0, 0), z_dir=(0, 1, 0)).offset(SPLIT5_START)):
        with BuildLine():
            Line((50.5, -40.25), (50.5, -35.25))
            Line((50.5, -35.25), (-42.5, -35.25))
            Line((-42.5, -35.25), (-42.5, 35.25))
            Line((-42.5, 35.25), (-7.936491673, 35.25))
            ThreePointArc((-7.936491673, 35.25), (-6, 34.75), (-4.063508327, 35.25))
            Line((-4.063508327, 35.25), (22.763508327, 35.25))
            ThreePointArc((22.763508327, 35.25), (24.7, 34.75), (26.636491673, 35.25))
            Line((26.636491673, 35.25), (50.5, 35.25))
            Line((50.5, 35.25), (50.5, 40.25))
            ThreePointArc((50.5, 40.25), (49.621320344, 42.371320344), (47.5, 43.25))
            Line((47.5, 43.25), (-47.5, 43.25))
            ThreePointArc((-47.5, 43.25), (-49.621320344, 42.371320344), (-50.5, 40.25))
            Line((-50.5, 40.25), (-50.5, -40.25))
            ThreePointArc((-50.5, -40.25), (-49.621320344, -42.371320344), (-47.5, -43.25))
            Line((-47.5, -43.25), (47.5, -43.25))
            ThreePointArc((47.5, -43.25), (49.621320344, -42.371320344), (50.5, -40.25))
        make_face()
    # profile 2 of 9: a face of its own
    with BuildSketch(Plane(origin=(0, 0, 0), x_dir=(1, 0, 0), z_dir=(0, 1, 0)).offset(SPLIT5_START)):
        with Locations((-29.5, -17.25)):
            Rectangle(SPLIT5_OUTLINE_W, SPLIT5_OUTLINE_H)
        with Locations((-29.5, -17.25)):
            Circle(SPLIT5_OUTLINE_R, mode=Mode.SUBTRACT)
    # profile 3 of 9: a face of its own
    with BuildSketch(Plane(origin=(0, 0, 0), x_dir=(1, 0, 0), z_dir=(0, 1, 0)).offset(SPLIT5_START)):
        with Locations((-6.5, 3.25)):
            Circle(SPLIT5_OUTLINE_R_2)
        with Locations((-6.5, 3.25)):
            Circle(SPLIT5_OUTLINE_R_3, mode=Mode.SUBTRACT)
    # profile 4 of 9: a face of its own
    with BuildSketch(Plane(origin=(0, 0, 0), x_dir=(1, 0, 0), z_dir=(0, 1, 0)).offset(SPLIT5_START)):
        with Locations((-6.5, 23.25)):
            Circle(SPLIT5_OUTLINE_R_2)
        with Locations((-6.5, 23.25)):
            Circle(SPLIT5_OUTLINE_R_3, mode=Mode.SUBTRACT)
    # profile 5 of 9: a face of its own
    with BuildSketch(Plane(origin=(0, 0, 0), x_dir=(1, 0, 0), z_dir=(0, 1, 0)).offset(SPLIT5_START)):
        with Locations((13.5, 13.25)):
            Circle(SPLIT5_OUTLINE_R_2)
        with Locations((13.5, 13.25)):
            Circle(SPLIT5_OUTLINE_R_3, mode=Mode.SUBTRACT)
    # profile 6 of 9: a face of its own
    with BuildSketch(Plane(origin=(0, 0, 0), x_dir=(1, 0, 0), z_dir=(0, 1, 0)).offset(SPLIT5_START)):
        with Locations((33.5, 3.25)):
            Circle(SPLIT5_OUTLINE_R_2)
        with Locations((33.5, 3.25)):
            Circle(SPLIT5_OUTLINE_R_3, mode=Mode.SUBTRACT)
    # profile 7 of 9: a face of its own
    with BuildSketch(Plane(origin=(0, 0, 0), x_dir=(1, 0, 0), z_dir=(0, 1, 0)).offset(SPLIT5_START)):
        with Locations((33.5, 23.25)):
            Circle(SPLIT5_OUTLINE_R_2)
        with Locations((33.5, 23.25)):
            Circle(SPLIT5_OUTLINE_R_3, mode=Mode.SUBTRACT)
    # profile 8 of 9: a face of its own
    with BuildSketch(Plane(origin=(0, 0, 0), x_dir=(1, 0, 0), z_dir=(0, 1, 0)).offset(SPLIT5_START)):
        with Locations((-6, -12.25)):
            Circle(SPLIT5_OUTLINE_R_2)
        with Locations((-6, -12.25)):
            Circle(SPLIT5_OUTLINE_R_4, mode=Mode.SUBTRACT)
    # profile 9 of 9: a face of its own
    with BuildSketch(Plane(origin=(0, 0, 0), x_dir=(1, 0, 0), z_dir=(0, 1, 0)).offset(SPLIT5_START)):
        with Locations((24.7, -12.25)):
            Circle(SPLIT5_OUTLINE_R_2)
        with Locations((24.7, -12.25)):
            Circle(SPLIT5_OUTLINE_R_4, mode=Mode.SUBTRACT)
    extrude(amount=SPLIT5_DEPTH, mode=Mode.SUBTRACT)

    # Split5 2 outline → Split5 2 (cut)
    with BuildSketch(Plane(origin=(0, 0, 0), x_dir=(1, 0, 0), z_dir=(0, 1, 0)).offset(SPLIT5_START)):
        with BuildLine():
            Line((50.5, -35.25), (50.5, 35.25))
            Line((50.5, 35.25), (26.636491673, 35.25))
            ThreePointArc((26.636491673, 35.25), (24.7, 34.75), (22.763508327, 35.25))
            Line((22.763508327, 35.25), (-4.063508327, 35.25))
            ThreePointArc((-4.063508327, 35.25), (-6, 34.75), (-7.936491673, 35.25))
            Line((-7.936491673, 35.25), (-42.5, 35.25))
            Line((-42.5, 35.25), (-42.5, -35.25))
            Line((-42.5, -35.25), (50.5, -35.25))
        make_face()
        with BuildLine():
            ThreePointArc((-15.5, -29.25), (-17.5, -31.25), (-19.5, -29.25))
            Line((-19.5, -29.25), (-19.5, -21.25))
            ThreePointArc((-19.5, -21.25), (-17.5, -19.25), (-15.5, -21.25))
            Line((-15.5, -21.25), (-15.5, -29.25))
        make_face(mode=Mode.SUBTRACT)
        with BuildLine():
            ThreePointArc((-7.5, -29.25), (-9.5, -31.25), (-11.5, -29.25))
            Line((-11.5, -29.25), (-11.5, -21.25))
            ThreePointArc((-11.5, -21.25), (-9.5, -19.25), (-7.5, -21.25))
            Line((-7.5, -21.25), (-7.5, -29.25))
        make_face(mode=Mode.SUBTRACT)
        with Locations((-29.5, -17.25)):
            Rectangle(SPLIT5_2_OUTLINE_W, SPLIT5_2_OUTLINE_H, mode=Mode.SUBTRACT)
        with Locations((-6, -12.25)):
            Circle(SPLIT5_2_OUTLINE_R, mode=Mode.SUBTRACT)
        with Locations((19.15, -29.25)):
            Rectangle(SPLIT5_2_OUTLINE_W_2, SPLIT5_2_OUTLINE_H_2, mode=Mode.SUBTRACT)
        with Locations((30.6, -29.25)):
            Rectangle(SPLIT5_2_OUTLINE_W_3, SPLIT5_2_OUTLINE_H_3, mode=Mode.SUBTRACT)
        with Locations((24.7, -12.25)):
            Circle(SPLIT5_2_OUTLINE_R, mode=Mode.SUBTRACT)
        with Locations((-6.5, 3.25)):
            Circle(SPLIT5_2_OUTLINE_R, mode=Mode.SUBTRACT)
        with Locations((-6.5, 23.25)):
            Circle(SPLIT5_2_OUTLINE_R, mode=Mode.SUBTRACT)
        with Locations((13.5, 13.25)):
            Circle(SPLIT5_2_OUTLINE_R, mode=Mode.SUBTRACT)
        with Locations((33.5, 3.25)):
            Circle(SPLIT5_2_OUTLINE_R, mode=Mode.SUBTRACT)
        with Locations((33.5, 23.25)):
            Circle(SPLIT5_2_OUTLINE_R, mode=Mode.SUBTRACT)
        with Locations((46.5, -25.25)):
            Circle(SPLIT5_2_OUTLINE_R_2, mode=Mode.SUBTRACT)
        with Locations((46.5, 25.25)):
            Circle(SPLIT5_2_OUTLINE_R_2, mode=Mode.SUBTRACT)
    extrude(amount=SPLIT5_2_DEPTH, mode=Mode.SUBTRACT)


solid = part.part
